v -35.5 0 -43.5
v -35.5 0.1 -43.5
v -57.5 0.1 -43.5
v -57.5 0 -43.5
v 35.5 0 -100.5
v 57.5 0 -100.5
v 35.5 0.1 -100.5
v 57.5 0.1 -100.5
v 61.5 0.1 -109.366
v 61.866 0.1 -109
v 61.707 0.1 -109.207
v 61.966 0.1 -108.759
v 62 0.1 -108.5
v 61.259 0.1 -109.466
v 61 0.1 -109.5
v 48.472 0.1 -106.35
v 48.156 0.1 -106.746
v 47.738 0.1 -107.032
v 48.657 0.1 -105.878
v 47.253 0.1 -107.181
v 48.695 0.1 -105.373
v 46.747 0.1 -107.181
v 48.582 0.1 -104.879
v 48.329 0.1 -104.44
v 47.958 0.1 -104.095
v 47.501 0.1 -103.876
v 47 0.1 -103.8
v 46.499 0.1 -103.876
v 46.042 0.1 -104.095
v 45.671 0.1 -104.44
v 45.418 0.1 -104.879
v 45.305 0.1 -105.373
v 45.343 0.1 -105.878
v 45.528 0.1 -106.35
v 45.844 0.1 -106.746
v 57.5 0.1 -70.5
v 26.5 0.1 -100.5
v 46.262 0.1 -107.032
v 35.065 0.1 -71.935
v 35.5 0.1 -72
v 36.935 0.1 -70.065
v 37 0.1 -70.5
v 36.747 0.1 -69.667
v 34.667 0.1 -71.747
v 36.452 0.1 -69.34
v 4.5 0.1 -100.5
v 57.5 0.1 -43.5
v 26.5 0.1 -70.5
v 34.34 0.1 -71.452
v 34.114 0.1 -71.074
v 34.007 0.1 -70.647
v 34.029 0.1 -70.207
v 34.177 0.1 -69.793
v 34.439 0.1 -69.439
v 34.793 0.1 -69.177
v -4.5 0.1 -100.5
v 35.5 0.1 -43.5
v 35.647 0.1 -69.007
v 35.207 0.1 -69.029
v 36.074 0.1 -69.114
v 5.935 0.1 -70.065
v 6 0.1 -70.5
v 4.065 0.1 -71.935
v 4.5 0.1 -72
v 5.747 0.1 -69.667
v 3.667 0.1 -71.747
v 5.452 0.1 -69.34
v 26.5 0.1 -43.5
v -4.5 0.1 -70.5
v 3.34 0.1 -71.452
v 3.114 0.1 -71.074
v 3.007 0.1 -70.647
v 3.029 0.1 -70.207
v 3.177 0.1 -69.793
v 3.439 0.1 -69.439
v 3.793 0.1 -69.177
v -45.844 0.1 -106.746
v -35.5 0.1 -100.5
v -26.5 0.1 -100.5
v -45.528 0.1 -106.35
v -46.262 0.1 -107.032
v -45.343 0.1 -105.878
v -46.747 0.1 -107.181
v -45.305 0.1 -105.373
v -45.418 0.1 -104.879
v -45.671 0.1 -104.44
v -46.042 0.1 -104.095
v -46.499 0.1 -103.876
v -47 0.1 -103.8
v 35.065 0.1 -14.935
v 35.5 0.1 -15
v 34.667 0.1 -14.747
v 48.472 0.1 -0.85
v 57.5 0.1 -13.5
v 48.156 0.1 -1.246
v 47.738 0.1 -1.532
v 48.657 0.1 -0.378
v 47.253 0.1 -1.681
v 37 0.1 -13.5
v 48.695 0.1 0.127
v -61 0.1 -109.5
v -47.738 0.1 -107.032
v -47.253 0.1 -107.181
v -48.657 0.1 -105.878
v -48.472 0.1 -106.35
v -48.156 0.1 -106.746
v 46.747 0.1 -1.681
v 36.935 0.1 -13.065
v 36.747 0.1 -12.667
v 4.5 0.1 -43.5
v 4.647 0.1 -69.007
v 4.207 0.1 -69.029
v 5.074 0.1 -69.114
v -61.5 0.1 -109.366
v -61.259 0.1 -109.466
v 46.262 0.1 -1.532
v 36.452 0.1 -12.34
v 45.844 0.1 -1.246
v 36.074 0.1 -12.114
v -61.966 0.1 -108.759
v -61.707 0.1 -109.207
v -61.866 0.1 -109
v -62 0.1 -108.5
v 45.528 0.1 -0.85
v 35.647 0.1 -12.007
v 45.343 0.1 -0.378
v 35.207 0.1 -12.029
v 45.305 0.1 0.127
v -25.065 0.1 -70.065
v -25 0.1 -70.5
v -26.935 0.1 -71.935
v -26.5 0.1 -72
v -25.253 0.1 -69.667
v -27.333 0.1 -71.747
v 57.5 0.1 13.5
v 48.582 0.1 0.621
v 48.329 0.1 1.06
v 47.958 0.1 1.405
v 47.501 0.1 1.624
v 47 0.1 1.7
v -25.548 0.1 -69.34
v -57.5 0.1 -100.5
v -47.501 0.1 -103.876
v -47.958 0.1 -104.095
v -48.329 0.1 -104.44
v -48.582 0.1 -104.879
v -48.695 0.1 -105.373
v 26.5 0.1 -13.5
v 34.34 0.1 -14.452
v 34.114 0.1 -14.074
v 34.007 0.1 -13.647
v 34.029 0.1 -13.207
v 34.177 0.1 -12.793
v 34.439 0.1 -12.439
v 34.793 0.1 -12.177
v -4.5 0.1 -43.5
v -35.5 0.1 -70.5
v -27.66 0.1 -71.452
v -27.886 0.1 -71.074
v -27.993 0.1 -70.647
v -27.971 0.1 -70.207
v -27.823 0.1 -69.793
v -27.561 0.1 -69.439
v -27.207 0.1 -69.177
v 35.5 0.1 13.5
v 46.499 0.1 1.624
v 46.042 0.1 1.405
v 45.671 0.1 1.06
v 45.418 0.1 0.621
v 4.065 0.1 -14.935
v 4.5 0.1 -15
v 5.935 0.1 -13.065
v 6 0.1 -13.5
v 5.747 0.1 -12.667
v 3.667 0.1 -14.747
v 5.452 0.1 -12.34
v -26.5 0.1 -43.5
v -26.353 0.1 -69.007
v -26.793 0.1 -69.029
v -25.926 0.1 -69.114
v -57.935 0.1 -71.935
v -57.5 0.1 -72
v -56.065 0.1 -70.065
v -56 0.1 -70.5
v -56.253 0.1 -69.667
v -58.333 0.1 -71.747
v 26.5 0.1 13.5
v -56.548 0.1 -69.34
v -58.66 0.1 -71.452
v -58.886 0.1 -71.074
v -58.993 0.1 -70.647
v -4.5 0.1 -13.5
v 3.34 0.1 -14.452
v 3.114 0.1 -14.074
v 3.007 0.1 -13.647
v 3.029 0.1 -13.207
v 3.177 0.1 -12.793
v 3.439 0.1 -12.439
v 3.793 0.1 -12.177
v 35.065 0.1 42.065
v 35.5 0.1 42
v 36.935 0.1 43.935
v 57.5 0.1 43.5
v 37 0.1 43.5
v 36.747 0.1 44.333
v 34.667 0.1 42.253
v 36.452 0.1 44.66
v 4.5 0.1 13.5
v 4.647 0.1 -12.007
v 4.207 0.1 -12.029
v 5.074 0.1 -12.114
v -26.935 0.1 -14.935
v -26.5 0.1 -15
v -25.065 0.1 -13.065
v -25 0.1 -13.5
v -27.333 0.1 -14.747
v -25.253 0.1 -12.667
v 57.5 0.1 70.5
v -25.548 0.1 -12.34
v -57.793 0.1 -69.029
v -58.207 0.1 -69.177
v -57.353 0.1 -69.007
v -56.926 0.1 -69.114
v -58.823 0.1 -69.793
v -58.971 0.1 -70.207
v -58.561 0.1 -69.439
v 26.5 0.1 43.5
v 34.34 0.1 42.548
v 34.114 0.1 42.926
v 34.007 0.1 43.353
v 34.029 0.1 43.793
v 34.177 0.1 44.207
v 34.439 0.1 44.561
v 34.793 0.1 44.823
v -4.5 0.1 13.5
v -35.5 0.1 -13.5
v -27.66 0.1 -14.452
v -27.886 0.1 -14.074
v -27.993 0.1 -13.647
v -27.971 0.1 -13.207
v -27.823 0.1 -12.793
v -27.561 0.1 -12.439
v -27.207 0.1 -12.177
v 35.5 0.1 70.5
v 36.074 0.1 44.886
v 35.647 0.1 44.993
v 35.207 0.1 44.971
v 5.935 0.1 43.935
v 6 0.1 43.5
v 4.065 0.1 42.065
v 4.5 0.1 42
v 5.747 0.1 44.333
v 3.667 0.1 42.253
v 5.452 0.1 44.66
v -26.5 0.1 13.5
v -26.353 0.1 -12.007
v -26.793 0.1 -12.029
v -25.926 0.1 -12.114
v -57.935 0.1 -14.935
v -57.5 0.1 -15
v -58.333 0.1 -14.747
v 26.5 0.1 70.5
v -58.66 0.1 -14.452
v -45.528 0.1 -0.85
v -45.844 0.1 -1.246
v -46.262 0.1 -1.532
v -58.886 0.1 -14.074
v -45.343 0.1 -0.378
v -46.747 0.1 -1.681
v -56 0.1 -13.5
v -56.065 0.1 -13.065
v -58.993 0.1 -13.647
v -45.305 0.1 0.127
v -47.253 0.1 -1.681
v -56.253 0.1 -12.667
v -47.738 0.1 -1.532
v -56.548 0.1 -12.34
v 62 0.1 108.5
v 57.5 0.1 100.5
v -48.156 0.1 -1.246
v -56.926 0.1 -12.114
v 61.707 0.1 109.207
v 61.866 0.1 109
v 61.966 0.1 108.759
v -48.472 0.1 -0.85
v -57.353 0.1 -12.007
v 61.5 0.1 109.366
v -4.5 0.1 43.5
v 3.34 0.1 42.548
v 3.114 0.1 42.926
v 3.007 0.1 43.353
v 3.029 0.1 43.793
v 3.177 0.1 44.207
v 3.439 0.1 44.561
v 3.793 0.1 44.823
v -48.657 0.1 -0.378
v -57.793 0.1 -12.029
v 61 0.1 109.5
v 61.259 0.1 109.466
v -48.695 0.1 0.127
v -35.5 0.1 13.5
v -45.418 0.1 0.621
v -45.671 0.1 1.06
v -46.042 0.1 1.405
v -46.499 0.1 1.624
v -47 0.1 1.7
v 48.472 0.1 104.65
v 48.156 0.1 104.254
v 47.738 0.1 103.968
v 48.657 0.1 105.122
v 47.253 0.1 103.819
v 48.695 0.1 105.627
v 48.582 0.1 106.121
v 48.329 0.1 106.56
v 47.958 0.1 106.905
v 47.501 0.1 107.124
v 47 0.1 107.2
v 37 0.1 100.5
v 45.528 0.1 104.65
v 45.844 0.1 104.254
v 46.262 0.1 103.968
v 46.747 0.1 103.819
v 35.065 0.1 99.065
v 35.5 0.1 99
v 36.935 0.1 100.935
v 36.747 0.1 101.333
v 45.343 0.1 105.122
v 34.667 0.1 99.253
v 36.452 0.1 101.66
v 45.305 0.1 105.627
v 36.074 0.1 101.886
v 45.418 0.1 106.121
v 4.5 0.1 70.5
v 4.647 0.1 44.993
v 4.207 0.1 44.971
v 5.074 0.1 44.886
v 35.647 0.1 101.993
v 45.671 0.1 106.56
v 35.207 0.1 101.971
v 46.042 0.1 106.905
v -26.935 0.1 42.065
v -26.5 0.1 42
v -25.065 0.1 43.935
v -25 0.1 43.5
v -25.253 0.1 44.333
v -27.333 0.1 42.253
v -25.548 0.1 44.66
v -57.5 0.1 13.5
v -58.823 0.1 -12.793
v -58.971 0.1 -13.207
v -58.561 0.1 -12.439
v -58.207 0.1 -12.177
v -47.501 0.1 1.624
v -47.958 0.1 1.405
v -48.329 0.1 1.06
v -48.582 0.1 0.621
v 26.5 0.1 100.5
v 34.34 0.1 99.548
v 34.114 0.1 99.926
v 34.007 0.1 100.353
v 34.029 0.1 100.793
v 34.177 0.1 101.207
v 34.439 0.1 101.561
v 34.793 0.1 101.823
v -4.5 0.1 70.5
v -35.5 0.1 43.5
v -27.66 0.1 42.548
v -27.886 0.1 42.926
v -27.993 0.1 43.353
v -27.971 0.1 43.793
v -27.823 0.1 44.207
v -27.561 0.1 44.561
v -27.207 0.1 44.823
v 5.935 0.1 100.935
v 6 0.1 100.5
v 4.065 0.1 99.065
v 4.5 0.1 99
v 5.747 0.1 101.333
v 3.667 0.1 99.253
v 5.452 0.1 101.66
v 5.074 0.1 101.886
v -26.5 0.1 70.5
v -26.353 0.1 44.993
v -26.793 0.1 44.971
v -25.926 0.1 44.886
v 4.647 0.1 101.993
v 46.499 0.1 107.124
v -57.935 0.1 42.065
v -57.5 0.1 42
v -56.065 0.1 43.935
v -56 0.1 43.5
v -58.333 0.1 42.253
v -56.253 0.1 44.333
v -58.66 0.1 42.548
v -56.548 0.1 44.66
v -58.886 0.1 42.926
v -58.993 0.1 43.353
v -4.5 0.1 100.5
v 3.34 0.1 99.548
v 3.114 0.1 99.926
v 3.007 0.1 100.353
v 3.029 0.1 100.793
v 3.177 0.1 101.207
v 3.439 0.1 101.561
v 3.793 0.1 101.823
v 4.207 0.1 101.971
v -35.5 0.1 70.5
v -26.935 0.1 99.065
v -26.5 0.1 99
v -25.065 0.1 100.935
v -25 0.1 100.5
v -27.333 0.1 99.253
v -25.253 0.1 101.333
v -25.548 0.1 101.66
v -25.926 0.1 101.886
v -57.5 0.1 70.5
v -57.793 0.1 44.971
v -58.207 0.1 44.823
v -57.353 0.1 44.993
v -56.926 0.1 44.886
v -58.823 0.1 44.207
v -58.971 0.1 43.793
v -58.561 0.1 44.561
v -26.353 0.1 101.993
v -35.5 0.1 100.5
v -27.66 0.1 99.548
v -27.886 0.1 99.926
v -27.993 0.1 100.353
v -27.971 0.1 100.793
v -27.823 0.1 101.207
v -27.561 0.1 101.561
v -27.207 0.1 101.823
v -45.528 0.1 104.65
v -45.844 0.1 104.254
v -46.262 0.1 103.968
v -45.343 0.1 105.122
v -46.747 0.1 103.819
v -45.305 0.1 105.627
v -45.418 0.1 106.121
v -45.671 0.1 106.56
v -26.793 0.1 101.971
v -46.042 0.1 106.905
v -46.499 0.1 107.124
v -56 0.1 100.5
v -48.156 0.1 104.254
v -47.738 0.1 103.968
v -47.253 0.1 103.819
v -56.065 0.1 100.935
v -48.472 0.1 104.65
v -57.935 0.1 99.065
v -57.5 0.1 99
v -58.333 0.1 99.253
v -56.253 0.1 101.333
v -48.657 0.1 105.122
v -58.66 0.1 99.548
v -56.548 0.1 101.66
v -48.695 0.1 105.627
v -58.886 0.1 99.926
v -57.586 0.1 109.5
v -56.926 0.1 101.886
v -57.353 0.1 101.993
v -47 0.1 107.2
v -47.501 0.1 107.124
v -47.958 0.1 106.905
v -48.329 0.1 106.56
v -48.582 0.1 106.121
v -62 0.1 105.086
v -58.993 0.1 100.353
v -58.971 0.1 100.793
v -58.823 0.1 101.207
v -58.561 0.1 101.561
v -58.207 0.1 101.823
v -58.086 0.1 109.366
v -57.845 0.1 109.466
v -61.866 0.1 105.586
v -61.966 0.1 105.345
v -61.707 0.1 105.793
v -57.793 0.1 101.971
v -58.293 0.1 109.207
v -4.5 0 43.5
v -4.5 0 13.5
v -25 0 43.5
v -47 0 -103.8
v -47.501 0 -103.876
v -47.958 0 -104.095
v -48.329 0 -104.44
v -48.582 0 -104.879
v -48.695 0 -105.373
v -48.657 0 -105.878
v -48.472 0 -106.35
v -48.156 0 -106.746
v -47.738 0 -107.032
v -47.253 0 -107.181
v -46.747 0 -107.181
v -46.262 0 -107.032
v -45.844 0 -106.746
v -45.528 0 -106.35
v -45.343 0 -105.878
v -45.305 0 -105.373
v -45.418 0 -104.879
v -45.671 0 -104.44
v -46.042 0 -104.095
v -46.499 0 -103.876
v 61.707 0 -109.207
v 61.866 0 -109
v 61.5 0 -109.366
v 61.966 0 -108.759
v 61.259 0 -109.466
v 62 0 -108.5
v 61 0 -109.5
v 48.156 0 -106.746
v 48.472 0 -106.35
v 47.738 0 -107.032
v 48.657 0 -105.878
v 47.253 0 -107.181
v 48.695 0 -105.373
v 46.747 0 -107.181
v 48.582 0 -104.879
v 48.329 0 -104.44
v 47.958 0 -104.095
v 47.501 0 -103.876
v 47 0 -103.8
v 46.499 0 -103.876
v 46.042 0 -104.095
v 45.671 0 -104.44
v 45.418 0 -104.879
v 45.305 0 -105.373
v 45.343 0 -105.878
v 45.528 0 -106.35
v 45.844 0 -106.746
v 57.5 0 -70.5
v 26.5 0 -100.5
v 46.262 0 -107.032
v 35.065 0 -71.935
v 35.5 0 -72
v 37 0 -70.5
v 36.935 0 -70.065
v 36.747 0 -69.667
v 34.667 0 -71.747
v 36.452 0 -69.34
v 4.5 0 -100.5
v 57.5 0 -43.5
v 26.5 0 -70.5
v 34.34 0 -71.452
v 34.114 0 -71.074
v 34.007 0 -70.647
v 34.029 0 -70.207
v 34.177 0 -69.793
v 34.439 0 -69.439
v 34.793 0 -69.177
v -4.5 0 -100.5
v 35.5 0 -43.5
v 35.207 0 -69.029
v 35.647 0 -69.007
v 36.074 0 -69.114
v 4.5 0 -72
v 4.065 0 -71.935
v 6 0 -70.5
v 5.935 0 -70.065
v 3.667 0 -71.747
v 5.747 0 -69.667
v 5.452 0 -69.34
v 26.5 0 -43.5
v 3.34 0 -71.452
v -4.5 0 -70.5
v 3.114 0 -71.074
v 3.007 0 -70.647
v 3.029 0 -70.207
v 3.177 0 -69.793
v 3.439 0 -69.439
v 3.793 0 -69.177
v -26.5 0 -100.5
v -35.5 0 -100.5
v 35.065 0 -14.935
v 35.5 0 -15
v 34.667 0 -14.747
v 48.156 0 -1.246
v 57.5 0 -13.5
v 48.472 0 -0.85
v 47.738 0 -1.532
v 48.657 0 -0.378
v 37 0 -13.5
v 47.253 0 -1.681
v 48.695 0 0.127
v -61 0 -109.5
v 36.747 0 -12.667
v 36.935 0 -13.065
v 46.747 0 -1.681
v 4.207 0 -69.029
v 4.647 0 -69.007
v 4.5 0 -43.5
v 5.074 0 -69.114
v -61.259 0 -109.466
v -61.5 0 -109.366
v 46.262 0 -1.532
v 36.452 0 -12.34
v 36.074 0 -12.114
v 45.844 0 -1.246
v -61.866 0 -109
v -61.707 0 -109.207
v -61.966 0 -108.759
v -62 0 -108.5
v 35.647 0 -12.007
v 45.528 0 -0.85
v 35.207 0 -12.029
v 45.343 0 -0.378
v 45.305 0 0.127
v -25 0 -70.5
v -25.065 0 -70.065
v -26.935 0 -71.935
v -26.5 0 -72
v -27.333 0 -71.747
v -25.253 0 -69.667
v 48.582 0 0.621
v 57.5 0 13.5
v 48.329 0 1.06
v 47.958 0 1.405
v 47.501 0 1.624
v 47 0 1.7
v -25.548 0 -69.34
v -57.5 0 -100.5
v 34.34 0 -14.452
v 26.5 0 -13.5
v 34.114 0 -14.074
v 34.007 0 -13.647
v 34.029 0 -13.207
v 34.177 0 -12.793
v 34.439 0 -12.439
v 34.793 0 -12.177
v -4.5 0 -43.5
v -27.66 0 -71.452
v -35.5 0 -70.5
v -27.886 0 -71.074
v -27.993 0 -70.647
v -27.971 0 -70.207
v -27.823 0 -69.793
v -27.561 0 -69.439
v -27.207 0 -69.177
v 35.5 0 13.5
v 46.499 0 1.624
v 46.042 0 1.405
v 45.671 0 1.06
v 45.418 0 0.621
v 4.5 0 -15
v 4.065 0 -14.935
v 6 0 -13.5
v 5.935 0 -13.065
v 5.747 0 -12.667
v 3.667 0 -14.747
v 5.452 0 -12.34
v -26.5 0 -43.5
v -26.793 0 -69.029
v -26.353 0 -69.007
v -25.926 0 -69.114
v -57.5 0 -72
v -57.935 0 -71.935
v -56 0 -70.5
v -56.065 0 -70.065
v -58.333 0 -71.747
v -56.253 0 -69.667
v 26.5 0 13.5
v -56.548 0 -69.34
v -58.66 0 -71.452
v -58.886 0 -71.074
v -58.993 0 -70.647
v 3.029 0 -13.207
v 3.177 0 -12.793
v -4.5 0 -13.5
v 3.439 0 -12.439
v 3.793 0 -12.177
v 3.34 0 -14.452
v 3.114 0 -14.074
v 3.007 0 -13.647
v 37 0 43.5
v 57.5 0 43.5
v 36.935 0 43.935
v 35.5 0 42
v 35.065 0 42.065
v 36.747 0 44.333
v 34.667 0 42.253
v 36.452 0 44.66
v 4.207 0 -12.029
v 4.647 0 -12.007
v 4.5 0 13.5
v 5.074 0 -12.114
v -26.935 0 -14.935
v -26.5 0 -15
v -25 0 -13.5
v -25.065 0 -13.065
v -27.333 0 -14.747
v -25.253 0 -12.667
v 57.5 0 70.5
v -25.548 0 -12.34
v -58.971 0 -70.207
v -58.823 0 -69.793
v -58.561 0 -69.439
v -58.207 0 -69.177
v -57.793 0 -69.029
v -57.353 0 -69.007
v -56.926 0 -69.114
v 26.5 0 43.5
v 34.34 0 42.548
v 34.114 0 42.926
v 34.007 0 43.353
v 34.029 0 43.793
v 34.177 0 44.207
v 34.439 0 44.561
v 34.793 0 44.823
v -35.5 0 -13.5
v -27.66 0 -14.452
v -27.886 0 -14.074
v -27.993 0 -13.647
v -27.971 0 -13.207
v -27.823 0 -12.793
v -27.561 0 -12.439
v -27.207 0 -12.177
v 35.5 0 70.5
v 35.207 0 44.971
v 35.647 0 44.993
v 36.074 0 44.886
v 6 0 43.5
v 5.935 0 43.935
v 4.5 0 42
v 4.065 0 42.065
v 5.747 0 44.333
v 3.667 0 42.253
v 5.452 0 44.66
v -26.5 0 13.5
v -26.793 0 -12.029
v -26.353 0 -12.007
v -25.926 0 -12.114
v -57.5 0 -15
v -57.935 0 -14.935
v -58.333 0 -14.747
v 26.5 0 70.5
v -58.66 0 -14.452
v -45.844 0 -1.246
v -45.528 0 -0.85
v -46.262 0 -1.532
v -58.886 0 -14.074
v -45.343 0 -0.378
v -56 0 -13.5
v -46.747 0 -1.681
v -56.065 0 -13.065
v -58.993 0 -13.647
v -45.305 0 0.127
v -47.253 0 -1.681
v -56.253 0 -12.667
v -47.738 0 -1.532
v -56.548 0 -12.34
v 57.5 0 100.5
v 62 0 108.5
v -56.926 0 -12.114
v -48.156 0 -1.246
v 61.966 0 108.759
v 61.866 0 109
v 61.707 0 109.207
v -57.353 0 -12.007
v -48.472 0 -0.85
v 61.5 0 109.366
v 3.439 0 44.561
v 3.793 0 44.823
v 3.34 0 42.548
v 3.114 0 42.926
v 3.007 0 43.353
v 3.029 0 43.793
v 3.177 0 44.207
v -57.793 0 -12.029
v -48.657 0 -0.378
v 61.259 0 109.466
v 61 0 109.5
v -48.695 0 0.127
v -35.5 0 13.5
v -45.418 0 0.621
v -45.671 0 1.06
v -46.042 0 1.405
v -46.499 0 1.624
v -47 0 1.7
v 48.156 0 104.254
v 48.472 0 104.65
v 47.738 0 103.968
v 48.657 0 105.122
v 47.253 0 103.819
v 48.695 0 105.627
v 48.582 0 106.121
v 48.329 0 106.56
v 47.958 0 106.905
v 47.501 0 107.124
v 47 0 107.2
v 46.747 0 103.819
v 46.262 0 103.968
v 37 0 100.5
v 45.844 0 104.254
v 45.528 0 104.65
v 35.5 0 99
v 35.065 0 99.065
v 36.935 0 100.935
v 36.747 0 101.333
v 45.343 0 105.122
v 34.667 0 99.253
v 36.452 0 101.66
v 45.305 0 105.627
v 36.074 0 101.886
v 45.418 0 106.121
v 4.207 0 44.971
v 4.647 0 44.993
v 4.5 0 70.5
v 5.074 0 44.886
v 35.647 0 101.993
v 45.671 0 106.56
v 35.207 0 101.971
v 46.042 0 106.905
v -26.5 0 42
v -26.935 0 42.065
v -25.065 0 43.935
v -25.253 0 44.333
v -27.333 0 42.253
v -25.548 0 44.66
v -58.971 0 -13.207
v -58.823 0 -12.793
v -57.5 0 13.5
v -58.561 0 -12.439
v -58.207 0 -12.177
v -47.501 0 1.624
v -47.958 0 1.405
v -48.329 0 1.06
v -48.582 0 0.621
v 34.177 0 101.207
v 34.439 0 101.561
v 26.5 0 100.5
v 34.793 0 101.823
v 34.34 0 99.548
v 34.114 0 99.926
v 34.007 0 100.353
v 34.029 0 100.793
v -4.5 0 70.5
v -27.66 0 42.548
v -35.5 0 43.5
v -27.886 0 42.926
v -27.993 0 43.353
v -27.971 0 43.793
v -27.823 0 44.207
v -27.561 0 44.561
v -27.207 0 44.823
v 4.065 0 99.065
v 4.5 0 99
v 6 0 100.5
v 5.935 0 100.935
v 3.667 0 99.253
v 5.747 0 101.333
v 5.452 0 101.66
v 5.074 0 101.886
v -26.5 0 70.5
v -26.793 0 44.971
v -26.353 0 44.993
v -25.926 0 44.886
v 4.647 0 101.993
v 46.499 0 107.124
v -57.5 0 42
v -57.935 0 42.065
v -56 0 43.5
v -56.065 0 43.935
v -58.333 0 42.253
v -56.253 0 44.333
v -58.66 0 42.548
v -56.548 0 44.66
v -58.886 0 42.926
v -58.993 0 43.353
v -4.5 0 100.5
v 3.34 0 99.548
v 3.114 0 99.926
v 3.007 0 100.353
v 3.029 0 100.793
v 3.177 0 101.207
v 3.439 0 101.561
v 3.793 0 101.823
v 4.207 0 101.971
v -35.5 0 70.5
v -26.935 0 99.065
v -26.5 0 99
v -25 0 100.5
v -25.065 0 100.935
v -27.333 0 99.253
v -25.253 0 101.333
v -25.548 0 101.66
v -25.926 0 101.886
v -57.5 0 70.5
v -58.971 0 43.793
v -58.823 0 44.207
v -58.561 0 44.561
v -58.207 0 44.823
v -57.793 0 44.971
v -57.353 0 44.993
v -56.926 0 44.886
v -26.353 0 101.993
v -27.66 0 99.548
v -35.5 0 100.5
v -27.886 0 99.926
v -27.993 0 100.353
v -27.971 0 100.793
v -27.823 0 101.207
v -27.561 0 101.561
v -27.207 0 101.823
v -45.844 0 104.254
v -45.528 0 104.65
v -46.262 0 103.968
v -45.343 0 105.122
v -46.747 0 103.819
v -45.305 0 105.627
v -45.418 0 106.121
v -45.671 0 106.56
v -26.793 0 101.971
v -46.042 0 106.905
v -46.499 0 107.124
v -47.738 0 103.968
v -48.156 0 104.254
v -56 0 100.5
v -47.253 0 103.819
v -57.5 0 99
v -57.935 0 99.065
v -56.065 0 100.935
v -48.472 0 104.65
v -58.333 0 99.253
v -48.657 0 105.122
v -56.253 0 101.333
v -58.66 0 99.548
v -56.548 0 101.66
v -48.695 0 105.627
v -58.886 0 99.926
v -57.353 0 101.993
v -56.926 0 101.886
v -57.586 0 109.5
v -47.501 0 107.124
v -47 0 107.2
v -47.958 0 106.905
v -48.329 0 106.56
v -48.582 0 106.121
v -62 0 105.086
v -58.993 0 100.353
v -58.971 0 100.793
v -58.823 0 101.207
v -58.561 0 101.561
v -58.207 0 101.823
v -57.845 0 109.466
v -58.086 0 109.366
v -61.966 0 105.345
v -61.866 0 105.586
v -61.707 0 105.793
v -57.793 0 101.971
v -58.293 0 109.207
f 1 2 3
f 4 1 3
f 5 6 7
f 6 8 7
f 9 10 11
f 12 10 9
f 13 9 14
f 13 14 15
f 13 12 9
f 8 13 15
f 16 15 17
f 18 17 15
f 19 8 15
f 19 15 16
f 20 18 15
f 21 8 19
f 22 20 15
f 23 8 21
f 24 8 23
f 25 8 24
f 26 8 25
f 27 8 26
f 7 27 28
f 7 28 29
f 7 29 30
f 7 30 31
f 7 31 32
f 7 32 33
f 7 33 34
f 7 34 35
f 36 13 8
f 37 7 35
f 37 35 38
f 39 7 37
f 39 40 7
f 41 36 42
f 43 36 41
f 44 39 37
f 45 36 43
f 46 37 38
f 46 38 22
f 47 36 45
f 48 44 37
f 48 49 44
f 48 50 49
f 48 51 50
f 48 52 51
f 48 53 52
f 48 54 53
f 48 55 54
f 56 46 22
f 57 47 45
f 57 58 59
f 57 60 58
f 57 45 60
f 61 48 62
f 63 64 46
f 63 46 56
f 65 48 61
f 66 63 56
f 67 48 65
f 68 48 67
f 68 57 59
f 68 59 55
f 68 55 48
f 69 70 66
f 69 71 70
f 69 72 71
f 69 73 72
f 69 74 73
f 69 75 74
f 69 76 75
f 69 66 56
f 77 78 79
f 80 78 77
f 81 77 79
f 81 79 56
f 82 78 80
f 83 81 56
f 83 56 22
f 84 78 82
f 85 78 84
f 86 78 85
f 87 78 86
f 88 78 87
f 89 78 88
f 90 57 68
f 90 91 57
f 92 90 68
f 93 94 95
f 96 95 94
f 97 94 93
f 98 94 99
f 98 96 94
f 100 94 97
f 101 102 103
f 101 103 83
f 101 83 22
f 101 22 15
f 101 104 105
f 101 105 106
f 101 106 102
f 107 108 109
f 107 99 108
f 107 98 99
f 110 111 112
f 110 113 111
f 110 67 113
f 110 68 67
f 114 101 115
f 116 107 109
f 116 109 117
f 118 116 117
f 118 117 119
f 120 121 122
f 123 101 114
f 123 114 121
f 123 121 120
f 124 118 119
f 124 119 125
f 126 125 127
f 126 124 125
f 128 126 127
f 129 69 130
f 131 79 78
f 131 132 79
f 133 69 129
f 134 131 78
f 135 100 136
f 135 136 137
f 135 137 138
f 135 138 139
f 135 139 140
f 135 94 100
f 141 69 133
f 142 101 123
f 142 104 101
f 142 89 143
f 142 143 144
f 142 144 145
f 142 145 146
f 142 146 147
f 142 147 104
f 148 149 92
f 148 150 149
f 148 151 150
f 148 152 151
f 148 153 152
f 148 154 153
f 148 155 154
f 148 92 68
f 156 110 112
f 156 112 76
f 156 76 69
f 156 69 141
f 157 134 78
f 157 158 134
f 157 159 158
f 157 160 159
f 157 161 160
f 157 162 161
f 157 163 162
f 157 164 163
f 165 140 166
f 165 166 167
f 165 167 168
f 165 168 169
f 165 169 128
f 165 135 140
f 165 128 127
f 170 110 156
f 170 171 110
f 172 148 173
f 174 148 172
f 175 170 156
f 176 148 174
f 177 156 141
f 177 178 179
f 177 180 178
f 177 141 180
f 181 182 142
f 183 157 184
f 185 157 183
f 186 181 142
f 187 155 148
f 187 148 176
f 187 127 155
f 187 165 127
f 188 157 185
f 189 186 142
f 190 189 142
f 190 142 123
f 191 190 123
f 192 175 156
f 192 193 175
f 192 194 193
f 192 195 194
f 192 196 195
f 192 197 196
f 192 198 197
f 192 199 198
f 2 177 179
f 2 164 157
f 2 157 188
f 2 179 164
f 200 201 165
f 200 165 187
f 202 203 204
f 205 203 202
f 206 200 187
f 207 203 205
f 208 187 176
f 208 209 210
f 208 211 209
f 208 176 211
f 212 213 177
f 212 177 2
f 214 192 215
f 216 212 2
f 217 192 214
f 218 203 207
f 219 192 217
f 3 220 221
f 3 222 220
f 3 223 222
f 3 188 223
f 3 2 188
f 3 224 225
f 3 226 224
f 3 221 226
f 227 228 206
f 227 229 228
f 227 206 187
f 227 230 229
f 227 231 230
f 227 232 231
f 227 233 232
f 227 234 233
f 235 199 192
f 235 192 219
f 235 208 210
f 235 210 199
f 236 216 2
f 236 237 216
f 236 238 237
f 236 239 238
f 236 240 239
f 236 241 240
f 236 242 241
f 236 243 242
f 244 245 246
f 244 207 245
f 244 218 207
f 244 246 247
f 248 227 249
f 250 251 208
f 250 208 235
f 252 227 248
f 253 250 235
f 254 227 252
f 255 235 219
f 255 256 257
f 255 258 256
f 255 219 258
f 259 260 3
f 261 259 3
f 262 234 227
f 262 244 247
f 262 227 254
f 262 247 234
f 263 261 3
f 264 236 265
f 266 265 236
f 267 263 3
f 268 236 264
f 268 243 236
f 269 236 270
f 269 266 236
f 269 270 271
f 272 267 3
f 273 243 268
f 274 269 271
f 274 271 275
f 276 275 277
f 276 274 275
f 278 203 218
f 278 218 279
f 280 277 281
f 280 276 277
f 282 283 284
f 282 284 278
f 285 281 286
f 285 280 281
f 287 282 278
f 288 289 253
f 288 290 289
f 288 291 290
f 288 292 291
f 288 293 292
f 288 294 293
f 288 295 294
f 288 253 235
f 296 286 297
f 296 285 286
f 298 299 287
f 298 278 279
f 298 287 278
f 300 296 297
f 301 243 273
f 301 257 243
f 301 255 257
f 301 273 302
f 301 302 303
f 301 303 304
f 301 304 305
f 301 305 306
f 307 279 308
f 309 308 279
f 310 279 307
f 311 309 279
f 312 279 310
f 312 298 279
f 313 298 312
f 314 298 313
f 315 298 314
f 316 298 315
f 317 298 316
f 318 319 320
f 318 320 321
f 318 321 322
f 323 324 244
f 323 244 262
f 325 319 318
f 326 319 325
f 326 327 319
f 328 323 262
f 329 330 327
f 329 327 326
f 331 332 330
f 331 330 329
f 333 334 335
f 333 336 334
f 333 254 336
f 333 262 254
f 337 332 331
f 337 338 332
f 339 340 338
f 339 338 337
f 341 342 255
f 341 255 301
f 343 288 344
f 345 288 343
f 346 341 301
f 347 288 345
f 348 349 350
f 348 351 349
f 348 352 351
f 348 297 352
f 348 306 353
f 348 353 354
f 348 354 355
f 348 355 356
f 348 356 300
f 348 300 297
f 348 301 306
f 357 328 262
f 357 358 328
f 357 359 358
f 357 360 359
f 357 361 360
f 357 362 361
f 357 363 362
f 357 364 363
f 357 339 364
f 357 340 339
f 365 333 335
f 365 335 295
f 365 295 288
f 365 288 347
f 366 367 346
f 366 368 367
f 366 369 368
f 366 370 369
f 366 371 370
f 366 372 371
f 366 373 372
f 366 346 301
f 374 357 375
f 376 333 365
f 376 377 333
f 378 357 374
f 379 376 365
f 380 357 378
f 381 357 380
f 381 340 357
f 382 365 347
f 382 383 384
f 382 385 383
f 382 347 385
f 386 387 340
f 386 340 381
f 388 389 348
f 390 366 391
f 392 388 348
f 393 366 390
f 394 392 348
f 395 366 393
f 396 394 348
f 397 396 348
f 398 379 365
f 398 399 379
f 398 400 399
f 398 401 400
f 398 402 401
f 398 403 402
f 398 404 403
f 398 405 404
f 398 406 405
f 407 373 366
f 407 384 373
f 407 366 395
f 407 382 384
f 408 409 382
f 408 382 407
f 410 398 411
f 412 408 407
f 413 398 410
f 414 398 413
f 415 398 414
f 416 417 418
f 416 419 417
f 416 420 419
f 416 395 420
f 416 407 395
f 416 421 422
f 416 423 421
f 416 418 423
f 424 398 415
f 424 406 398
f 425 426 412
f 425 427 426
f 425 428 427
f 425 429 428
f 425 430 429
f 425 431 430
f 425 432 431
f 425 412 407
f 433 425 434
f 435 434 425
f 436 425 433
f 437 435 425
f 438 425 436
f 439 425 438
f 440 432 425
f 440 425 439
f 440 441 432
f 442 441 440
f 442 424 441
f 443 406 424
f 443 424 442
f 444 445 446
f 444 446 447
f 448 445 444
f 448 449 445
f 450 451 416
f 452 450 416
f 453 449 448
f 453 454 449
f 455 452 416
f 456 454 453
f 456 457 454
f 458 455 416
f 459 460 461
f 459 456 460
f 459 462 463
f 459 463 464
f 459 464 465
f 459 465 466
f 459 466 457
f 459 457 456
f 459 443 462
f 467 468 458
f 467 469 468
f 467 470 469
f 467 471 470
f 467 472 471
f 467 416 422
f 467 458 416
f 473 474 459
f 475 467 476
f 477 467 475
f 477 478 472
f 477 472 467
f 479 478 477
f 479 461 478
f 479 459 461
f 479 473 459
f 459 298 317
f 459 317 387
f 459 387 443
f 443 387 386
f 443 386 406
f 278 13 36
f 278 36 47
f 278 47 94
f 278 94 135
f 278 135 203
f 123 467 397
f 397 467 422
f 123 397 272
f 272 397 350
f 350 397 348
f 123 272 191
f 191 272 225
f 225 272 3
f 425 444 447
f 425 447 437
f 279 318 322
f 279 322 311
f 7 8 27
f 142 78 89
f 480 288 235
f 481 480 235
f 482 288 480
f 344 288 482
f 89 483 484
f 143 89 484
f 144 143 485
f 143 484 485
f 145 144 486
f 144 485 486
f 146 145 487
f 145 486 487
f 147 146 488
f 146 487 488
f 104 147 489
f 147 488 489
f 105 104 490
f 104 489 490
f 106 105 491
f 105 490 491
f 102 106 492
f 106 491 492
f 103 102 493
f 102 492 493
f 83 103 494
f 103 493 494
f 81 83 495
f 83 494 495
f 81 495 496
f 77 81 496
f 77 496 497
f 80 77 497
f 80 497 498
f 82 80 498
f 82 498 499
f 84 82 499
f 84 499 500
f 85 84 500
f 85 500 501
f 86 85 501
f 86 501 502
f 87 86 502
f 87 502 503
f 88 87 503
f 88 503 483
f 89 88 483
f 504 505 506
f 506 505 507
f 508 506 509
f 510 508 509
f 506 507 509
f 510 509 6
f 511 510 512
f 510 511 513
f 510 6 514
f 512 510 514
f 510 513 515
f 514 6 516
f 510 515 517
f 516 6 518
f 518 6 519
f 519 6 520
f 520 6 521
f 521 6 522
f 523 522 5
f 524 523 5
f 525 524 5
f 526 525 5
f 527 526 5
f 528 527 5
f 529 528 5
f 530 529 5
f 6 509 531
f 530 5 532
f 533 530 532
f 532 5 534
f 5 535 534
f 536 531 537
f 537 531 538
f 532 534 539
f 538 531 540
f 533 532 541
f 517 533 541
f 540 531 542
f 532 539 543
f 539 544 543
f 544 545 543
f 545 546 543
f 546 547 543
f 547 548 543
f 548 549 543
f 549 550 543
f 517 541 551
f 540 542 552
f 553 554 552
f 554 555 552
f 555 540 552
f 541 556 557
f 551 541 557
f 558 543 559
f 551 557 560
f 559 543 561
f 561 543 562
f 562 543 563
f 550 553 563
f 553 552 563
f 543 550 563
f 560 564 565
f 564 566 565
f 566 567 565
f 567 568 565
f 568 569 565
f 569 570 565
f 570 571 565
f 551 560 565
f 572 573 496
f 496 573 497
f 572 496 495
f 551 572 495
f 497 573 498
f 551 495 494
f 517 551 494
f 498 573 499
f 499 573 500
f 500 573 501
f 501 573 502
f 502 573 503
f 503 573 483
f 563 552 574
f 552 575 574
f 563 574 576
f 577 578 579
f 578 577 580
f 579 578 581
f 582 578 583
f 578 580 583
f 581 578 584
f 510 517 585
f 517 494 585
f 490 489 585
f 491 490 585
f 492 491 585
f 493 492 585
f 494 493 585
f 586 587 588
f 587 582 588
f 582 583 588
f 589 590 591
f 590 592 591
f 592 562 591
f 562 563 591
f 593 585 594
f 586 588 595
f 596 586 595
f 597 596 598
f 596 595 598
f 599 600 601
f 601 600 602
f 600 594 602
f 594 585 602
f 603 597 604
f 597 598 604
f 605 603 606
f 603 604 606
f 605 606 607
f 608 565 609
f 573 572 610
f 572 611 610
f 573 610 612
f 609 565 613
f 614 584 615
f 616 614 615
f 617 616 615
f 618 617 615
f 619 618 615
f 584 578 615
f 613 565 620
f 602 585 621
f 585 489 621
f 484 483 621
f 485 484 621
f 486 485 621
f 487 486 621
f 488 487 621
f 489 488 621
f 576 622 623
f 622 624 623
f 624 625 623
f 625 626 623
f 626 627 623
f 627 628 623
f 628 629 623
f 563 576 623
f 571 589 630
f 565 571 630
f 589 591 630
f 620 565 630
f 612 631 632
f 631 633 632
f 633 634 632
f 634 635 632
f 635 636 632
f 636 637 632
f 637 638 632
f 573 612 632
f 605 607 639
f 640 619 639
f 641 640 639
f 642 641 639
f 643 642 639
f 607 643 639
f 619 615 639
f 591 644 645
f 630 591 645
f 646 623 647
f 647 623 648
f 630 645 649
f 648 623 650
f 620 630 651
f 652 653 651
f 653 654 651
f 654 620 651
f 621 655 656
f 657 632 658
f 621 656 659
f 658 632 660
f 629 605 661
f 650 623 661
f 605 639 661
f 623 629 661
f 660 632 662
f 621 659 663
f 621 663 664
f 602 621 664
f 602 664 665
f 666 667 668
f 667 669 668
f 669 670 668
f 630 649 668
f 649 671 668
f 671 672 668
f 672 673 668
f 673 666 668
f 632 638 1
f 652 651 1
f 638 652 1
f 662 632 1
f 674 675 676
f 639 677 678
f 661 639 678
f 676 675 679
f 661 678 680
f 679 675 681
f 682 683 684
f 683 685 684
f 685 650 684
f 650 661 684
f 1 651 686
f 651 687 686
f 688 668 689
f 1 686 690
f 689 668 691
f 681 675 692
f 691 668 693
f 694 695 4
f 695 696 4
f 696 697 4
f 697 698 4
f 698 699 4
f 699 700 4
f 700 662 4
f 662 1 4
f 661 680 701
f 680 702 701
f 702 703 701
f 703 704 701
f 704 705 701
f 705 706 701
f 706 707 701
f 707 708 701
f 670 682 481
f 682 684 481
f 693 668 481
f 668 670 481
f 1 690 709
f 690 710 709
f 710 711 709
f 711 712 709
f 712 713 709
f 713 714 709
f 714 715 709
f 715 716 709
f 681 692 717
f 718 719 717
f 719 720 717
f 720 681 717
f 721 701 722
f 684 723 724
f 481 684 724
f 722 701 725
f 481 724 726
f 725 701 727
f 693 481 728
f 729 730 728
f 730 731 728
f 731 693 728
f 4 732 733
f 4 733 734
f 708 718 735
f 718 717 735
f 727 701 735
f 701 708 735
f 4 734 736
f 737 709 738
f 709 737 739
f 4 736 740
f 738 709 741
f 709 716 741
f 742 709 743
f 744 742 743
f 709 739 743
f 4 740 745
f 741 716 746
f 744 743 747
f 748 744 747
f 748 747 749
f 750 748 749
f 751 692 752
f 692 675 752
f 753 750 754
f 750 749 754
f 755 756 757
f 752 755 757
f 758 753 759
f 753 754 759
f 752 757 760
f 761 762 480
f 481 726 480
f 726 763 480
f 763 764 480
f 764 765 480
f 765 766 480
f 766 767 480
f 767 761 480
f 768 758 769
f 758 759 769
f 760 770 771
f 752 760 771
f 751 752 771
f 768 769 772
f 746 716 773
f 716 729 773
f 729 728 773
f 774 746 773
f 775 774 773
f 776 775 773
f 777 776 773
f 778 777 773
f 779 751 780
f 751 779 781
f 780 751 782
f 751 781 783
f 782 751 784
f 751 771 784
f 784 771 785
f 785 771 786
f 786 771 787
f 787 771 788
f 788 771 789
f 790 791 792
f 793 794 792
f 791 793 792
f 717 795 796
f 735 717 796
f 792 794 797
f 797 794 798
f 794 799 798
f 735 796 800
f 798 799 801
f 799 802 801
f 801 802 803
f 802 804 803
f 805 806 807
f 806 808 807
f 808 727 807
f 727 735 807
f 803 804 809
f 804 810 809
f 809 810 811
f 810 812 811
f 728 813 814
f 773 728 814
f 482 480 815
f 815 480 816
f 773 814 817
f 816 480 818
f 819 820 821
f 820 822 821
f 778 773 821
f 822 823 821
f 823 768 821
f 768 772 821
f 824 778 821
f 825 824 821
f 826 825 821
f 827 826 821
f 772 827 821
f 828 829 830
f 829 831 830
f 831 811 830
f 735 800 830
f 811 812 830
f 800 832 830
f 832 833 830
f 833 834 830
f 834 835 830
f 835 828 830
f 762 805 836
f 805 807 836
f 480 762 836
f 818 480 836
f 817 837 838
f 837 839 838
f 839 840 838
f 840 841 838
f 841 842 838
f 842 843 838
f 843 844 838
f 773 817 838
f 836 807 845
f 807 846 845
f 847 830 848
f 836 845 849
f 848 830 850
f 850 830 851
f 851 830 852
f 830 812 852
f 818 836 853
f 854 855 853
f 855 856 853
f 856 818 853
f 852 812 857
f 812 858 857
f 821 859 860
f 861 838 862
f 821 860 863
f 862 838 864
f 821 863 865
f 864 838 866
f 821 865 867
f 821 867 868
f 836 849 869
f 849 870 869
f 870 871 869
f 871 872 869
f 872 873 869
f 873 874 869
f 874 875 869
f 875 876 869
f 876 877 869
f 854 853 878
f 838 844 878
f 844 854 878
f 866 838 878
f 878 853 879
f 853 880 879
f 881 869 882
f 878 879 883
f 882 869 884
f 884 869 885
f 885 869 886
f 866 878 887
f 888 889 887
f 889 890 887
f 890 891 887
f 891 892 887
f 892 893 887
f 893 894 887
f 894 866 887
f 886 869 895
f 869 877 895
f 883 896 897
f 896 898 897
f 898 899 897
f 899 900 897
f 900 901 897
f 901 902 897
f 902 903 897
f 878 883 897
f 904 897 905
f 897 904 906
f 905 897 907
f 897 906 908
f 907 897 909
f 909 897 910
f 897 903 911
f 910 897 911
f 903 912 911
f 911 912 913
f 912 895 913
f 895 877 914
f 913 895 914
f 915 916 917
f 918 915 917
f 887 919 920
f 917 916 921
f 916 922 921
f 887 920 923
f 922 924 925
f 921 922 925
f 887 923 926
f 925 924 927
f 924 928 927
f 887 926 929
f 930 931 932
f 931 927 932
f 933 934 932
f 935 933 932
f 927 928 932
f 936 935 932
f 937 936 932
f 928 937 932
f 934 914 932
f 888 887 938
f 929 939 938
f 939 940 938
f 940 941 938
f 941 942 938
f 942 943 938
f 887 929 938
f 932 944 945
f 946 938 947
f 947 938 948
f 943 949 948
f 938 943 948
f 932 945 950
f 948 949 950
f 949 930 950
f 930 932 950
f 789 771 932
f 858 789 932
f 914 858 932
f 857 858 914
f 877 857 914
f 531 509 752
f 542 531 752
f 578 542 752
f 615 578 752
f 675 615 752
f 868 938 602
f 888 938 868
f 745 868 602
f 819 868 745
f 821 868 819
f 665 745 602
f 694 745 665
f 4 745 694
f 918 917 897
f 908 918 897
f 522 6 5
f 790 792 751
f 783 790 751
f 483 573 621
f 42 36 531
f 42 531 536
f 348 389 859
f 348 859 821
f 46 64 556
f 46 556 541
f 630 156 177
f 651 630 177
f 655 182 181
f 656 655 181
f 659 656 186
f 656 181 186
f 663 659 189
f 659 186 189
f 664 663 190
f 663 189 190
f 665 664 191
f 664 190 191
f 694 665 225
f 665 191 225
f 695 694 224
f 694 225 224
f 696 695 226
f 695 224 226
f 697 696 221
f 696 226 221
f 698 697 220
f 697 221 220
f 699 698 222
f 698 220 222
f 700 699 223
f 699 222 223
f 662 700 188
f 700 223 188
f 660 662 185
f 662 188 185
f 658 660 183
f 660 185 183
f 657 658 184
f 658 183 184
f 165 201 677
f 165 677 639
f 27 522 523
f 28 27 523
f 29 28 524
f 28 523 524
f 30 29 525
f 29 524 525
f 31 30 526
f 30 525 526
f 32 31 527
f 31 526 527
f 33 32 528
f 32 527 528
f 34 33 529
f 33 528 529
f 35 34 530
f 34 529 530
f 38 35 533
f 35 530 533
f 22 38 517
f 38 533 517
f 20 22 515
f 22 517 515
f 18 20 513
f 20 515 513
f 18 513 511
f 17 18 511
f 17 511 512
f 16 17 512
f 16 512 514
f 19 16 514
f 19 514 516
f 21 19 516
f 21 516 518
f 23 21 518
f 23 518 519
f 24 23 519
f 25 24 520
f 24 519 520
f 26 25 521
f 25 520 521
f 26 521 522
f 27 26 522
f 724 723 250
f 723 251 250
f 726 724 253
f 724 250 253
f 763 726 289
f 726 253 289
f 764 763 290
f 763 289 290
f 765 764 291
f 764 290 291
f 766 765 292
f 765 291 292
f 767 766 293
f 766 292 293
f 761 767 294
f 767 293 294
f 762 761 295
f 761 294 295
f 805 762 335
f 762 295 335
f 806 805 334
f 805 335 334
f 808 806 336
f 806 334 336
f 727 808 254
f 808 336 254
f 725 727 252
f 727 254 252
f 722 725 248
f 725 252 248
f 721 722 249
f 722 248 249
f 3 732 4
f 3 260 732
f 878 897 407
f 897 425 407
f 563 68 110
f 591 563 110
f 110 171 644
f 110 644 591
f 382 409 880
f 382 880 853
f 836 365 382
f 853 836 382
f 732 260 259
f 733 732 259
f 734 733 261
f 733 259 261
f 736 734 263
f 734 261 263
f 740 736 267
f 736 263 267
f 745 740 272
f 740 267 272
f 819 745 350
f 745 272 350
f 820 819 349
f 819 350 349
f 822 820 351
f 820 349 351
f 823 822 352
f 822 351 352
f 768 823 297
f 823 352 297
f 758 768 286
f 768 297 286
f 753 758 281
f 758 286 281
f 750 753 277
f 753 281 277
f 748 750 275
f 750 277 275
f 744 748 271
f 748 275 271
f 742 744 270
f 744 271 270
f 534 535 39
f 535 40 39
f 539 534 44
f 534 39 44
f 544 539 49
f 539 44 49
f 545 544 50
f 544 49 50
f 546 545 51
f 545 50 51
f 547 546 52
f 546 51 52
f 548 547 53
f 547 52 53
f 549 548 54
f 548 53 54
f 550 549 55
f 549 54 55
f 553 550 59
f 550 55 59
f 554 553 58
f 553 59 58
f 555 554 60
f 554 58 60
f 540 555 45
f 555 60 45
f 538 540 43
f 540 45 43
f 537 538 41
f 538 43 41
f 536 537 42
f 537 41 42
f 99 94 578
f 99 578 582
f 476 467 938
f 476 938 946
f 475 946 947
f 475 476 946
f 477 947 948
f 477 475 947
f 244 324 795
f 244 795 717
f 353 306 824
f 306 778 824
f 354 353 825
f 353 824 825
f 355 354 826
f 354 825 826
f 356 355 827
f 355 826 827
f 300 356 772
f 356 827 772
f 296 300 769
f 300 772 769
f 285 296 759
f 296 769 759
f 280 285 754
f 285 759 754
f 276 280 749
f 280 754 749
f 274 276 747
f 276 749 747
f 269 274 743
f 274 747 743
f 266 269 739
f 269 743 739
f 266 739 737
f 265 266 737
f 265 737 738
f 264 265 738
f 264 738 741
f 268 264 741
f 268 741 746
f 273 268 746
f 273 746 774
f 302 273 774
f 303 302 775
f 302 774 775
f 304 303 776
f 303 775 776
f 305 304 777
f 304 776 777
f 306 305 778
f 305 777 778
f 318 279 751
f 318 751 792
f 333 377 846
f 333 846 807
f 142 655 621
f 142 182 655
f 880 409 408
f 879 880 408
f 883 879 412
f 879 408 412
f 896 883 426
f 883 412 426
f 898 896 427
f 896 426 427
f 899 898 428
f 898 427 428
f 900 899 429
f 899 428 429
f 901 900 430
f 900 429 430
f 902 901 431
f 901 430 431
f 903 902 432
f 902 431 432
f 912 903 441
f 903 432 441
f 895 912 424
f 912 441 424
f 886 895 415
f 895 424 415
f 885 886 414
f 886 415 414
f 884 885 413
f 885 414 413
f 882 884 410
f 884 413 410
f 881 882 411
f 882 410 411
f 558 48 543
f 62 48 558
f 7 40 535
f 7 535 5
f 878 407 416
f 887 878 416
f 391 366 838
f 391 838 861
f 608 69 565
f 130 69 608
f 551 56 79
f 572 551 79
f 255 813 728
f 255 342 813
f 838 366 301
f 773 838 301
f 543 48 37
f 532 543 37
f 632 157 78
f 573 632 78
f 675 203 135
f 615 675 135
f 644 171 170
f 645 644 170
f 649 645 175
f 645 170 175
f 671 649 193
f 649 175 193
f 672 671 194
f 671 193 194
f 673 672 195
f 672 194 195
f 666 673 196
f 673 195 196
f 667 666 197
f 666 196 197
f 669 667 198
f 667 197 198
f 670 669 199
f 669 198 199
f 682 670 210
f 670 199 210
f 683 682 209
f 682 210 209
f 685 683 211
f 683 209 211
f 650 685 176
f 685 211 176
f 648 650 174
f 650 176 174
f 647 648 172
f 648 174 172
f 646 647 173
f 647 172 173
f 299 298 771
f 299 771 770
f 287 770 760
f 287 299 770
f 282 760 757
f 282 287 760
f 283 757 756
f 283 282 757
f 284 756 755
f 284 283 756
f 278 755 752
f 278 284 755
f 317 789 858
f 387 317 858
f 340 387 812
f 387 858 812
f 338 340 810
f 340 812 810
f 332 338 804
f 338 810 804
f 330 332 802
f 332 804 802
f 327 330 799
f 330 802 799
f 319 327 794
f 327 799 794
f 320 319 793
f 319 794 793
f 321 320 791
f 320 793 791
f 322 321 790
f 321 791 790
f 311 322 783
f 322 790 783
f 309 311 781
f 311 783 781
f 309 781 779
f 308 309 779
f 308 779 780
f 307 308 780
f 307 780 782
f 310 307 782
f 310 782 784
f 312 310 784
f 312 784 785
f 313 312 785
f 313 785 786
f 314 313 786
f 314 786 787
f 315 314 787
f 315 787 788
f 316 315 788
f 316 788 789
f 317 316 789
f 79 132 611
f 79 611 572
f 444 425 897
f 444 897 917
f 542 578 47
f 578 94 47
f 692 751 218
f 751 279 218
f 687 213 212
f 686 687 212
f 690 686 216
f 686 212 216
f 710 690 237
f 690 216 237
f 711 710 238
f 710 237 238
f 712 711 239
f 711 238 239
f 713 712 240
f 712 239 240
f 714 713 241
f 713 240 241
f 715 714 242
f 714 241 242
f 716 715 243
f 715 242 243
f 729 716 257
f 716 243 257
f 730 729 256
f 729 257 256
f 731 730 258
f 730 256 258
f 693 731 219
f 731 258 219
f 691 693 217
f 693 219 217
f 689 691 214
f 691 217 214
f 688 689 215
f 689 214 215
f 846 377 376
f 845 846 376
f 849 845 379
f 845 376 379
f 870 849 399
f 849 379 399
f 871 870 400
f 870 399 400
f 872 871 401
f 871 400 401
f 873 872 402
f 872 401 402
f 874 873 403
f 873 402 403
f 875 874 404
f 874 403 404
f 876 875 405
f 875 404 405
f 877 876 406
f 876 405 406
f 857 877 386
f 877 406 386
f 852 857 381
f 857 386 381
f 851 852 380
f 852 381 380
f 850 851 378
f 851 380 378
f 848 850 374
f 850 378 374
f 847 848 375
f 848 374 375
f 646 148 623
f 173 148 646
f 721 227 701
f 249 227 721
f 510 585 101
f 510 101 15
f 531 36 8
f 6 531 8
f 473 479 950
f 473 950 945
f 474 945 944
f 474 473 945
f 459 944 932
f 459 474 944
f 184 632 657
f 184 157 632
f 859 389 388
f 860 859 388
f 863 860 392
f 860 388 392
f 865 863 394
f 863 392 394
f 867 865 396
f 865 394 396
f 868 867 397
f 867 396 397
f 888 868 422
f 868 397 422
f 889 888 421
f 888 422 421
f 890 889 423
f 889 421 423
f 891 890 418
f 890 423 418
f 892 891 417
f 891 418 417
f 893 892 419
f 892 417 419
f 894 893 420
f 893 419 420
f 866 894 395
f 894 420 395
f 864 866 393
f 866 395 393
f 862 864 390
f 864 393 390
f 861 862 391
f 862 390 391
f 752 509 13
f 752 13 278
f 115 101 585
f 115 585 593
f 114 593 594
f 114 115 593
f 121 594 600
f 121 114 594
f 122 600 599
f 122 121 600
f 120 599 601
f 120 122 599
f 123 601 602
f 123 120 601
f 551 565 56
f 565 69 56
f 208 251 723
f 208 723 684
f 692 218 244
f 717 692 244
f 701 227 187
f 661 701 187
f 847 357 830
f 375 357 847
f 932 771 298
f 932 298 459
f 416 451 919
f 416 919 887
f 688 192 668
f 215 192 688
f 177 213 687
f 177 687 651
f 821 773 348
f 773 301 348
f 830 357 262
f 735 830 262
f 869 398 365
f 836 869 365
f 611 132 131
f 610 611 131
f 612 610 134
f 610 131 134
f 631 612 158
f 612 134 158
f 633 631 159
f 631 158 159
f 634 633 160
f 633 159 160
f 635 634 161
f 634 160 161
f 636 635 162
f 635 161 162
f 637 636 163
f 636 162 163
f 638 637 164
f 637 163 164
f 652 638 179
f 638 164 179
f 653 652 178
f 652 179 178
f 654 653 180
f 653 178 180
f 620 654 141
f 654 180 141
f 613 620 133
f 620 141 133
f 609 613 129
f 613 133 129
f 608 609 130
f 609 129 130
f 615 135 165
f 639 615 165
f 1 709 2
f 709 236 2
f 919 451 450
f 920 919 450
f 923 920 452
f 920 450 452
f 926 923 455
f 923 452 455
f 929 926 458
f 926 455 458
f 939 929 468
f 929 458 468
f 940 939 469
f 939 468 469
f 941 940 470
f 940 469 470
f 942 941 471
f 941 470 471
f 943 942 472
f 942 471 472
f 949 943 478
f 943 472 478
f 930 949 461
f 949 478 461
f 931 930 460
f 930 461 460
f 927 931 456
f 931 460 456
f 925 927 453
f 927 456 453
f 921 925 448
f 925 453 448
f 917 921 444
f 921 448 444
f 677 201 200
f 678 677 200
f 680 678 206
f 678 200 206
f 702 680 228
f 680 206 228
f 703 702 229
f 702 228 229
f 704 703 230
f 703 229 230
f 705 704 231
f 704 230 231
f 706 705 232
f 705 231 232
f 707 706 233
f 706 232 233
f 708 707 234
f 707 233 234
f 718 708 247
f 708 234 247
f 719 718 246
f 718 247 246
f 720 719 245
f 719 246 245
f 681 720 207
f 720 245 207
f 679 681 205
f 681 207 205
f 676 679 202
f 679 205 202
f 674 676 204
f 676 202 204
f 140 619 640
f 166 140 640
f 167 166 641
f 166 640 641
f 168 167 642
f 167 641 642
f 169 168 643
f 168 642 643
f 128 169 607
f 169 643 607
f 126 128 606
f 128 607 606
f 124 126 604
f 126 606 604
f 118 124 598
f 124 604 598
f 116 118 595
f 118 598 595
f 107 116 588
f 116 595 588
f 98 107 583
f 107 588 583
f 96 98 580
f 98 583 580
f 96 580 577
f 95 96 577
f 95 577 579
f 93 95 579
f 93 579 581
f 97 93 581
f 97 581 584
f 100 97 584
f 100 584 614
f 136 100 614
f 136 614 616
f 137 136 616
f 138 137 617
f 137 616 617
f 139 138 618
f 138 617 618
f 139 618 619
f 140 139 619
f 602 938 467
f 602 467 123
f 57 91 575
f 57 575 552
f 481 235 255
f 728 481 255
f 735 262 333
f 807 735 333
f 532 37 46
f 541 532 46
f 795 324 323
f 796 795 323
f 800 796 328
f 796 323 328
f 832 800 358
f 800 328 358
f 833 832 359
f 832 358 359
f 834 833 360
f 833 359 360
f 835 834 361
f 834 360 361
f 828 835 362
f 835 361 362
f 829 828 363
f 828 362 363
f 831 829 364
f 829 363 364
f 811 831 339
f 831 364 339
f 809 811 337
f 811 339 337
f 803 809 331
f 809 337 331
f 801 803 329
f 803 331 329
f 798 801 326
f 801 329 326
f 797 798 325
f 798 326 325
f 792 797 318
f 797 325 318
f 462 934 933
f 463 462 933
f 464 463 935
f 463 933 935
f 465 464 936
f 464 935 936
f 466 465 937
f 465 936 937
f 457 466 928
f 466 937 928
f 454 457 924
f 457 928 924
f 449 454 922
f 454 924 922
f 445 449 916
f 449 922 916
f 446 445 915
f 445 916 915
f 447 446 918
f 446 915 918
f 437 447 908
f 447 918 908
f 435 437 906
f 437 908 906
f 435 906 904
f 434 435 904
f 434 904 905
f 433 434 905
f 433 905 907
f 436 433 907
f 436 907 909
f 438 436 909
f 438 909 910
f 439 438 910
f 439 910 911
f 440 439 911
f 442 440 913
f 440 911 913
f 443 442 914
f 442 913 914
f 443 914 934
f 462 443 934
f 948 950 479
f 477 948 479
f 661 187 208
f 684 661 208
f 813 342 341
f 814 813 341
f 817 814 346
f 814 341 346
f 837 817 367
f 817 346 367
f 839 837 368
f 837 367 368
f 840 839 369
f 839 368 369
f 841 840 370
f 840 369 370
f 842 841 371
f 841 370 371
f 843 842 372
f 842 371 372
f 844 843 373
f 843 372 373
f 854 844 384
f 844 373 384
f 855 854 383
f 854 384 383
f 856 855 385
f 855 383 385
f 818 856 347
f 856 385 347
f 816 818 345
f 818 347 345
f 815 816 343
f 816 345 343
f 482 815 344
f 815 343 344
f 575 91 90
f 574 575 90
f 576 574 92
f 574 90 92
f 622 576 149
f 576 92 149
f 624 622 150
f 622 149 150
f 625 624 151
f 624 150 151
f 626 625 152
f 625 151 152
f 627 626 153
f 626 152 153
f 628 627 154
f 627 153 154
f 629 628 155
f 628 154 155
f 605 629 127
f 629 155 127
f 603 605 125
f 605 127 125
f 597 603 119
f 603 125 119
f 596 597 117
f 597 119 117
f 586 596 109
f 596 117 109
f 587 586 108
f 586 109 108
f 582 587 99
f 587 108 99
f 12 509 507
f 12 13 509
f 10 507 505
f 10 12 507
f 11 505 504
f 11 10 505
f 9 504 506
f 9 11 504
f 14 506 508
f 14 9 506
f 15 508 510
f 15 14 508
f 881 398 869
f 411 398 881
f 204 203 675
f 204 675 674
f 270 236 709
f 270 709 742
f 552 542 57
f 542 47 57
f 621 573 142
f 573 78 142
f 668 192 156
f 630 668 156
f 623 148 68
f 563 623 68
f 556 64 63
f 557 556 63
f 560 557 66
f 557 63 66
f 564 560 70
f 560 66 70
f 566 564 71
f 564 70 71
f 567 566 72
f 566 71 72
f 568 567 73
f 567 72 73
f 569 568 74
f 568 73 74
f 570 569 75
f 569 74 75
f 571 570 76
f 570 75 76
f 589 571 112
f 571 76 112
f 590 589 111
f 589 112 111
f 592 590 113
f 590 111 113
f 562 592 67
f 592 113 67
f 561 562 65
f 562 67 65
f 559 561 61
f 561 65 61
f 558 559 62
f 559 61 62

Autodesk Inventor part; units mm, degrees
ref_plane "YZ Plane" through (0, 0, 0) normal (1, 0, 0) x (0, 1, 0)
ref_plane "XZ Plane" through (0, 0, 0) normal (0, 1, 0) x (-1, 0, 0)
ref_plane "XY Plane" through (0, 0, 0) normal (0, 0, 1) x (1, 0, 0)
sketch "Sketch1" plane through (0, 0, 0) normal (0, 1, 0) x (-1, 0, 0)
  line L0 (-62, 109.5) -> (62, 109.5)
  line L1 (62, 109.5) -> (62, -109.5)
  line L2 (62, -109.5) -> (-62, -109.5)
  line L3 (-62, -109.5) -> (-62, 109.5)
  line L4 (-62, 109.5) -> (62, -109.5) construction
  line L5 (62, 109.5) -> (-62, -109.5) construction
  point P0 (0, 0)
  dimension "d0" = 219
  dimension "d1" = 124
extrude "Extrusion1" add sketch "Sketch1" along normal blind 0.1
chamfer "Chamfer1" distance 4 angle 45 1 edges at (-62, 0.05, 109.5)
sketch "Sketch2" plane through (0, 0.1, 0) normal (0, 1, 0) x (1, 0, 0)
  line L0 (-35.5, -100.5) -> (-35.5, -70.5)
  line L1 (-35.5, -70.5) -> (-57.5, -70.5)
  line L2 (-62, 109.5) -> (-62, -109.5) projected
  line L3 (-62, -109.5) -> (62, -109.5) projected
  arc A0 (-57.5, -99) -> (-56, -100.5) centre (-57.5, -100.5) ccw
  line L4 (-35.5, -100.5) -> (-56, -100.5)
  line L5 (-57.5, -99) -> (-57.5, -70.5)
  line L6 (62, -109.5) -> (62, 109.5) projected
  line L7 (-35.5, -43.5) -> (-35.5, -13.5)
  line L8 (-35.5, -43.5) -> (-56, -43.5)
  line L9 (-35.5, -13.5) -> (-57.5, -13.5)
  line L10 (-57.5, -42) -> (-57.5, -13.5)
  arc A1 (-57.5, -42) -> (-56, -43.5) centre (-57.5, -43.5) ccw
  line L11 (-35.5, 13.5) -> (-35.5, 43.5)
  line L12 (-35.5, 13.5) -> (-56, 13.5)
  line L13 (-35.5, 43.5) -> (-57.5, 43.5)
  line L14 (-57.5, 15) -> (-57.5, 43.5)
  arc A2 (-57.5, 15) -> (-56, 13.5) centre (-57.5, 13.5) ccw
  line L15 (-35.5, 70.5) -> (-35.5, 100.5)
  line L16 (-35.5, 70.5) -> (-56, 70.5)
  line L17 (-35.5, 100.5) -> (-57.5, 100.5)
  line L18 (-57.5, 72) -> (-57.5, 100.5)
  arc A3 (-57.5, 72) -> (-56, 70.5) centre (-57.5, 70.5) ccw
  line L19 (-4.5, -100.5) -> (-4.5, -70.5)
  line L20 (-4.5, -100.5) -> (-25, -100.5)
  line L21 (-4.5, -70.5) -> (-26.5, -70.5)
  line L22 (-26.5, -99) -> (-26.5, -70.5)
  arc A4 (-26.5, -99) -> (-25, -100.5) centre (-26.5, -100.5) ccw
  line L23 (-4.5, -43.5) -> (-4.5, -13.5)
  line L24 (-4.5, -43.5) -> (-25, -43.5)
  line L25 (-4.5, -13.5) -> (-26.5, -13.5)
  line L26 (-26.5, -42) -> (-26.5, -13.5)
  arc A5 (-26.5, -42) -> (-25, -43.5) centre (-26.5, -43.5) ccw
  line L27 (-4.5, 13.5) -> (-4.5, 43.5)
  line L28 (-4.5, 13.5) -> (-25, 13.5)
  line L29 (-4.5, 43.5) -> (-26.5, 43.5)
  line L30 (-26.5, 15) -> (-26.5, 43.5)
  arc A6 (-26.5, 15) -> (-25, 13.5) centre (-26.5, 13.5) ccw
  line L31 (-4.5, 70.5) -> (-4.5, 100.5)
  line L32 (-4.5, 70.5) -> (-25, 70.5)
  line L33 (-4.5, 100.5) -> (-26.5, 100.5)
  line L34 (-26.5, 72) -> (-26.5, 100.5)
  arc A7 (-26.5, 72) -> (-25, 70.5) centre (-26.5, 70.5) ccw
  line L35 (26.5, -100.5) -> (26.5, -70.5)
  line L36 (26.5, -100.5) -> (6, -100.5)
  line L37 (26.5, -70.5) -> (4.5, -70.5)
  line L38 (4.5, -99) -> (4.5, -70.5)
  arc A8 (4.5, -99) -> (6, -100.5) centre (4.5, -100.5) ccw
  line L39 (26.5, -43.5) -> (26.5, -13.5)
  line L40 (26.5, -43.5) -> (6, -43.5)
  line L41 (26.5, -13.5) -> (4.5, -13.5)
  line L42 (4.5, -42) -> (4.5, -13.5)
  arc A9 (4.5, -42) -> (6, -43.5) centre (4.5, -43.5) ccw
  line L43 (26.5, 13.5) -> (26.5, 43.5)
  line L44 (26.5, 13.5) -> (6, 13.5)
  line L45 (26.5, 43.5) -> (4.5, 43.5)
  line L46 (4.5, 15) -> (4.5, 43.5)
  arc A10 (4.5, 15) -> (6, 13.5) centre (4.5, 13.5) ccw
  line L47 (26.5, 70.5) -> (26.5, 100.5)
  line L48 (26.5, 70.5) -> (6, 70.5)
  line L49 (26.5, 100.5) -> (4.5, 100.5)
  line L50 (4.5, 72) -> (4.5, 100.5)
  arc A11 (4.5, 72) -> (6, 70.5) centre (4.5, 70.5) ccw
  line L51 (57.5, -100.5) -> (57.5, -70.5)
  line L52 (57.5, -100.5) -> (37, -100.5)
  line L53 (57.5, -70.5) -> (35.5, -70.5)
  line L54 (35.5, -99) -> (35.5, -70.5)
  arc A12 (35.5, -99) -> (37, -100.5) centre (35.5, -100.5) ccw
  line L55 (57.5, -43.5) -> (57.5, -13.5)
  line L56 (57.5, -43.5) -> (37, -43.5)
  line L57 (57.5, -13.5) -> (35.5, -13.5)
  line L58 (35.5, -42) -> (35.5, -13.5)
  arc A13 (35.5, -42) -> (37, -43.5) centre (35.5, -43.5) ccw
  line L59 (57.5, 13.5) -> (57.5, 43.5)
  line L60 (57.5, 13.5) -> (37, 13.5)
  line L61 (57.5, 43.5) -> (35.5, 43.5)
  line L62 (35.5, 15) -> (35.5, 43.5)
  arc A14 (35.5, 15) -> (37, 13.5) centre (35.5, 13.5) ccw
  line L63 (57.5, 70.5) -> (57.5, 100.5)
  line L64 (57.5, 70.5) -> (37, 70.5)
  line L65 (57.5, 100.5) -> (35.5, 100.5)
  line L66 (35.5, 72) -> (35.5, 100.5)
  arc A15 (35.5, 72) -> (37, 70.5) centre (35.5, 70.5) ccw
  dimension "d46" = 1.5
  dimension "d47" = 30
  dimension "d50" = 9
  dimension "d51" = 4.5
  dimension "d62" = 57
  dimension "d65" = 31
  dimension "d77" = 22
extrude "Extrusion2" cut sketch "Sketch2" against normal through all
fillet "Fillet1" radius 1 5 edges at (62, 0.05, 109.5) (-58, 0.05, 109.5) (-62, 0.05, 105.5) (62, 0.05, -109.5) (-62, 0.05, -109.5)
sketch "Sketch3" plane through (0, 0.1, 0) normal (0, 1, 0) x (1, 0, 0)
  line L0 (-62, 108.5) -> (-62, -105.0858) projected
  line L1 (62, -108.5) -> (62, 108.5) projected
  line L2 (-57.5858, -109.5) -> (61, -109.5) projected
  line L3 (61, 109.5) -> (-61, 109.5) projected
  point P0 (0, 0)
  point P1 (-47, -105.5)
  point P2 (47, -105.5)
  point P3 (47, 105.5)
  point P4 (-47, 105.5)
  point P5 (-47, 0)
  point P6 (47, 0)
  dimension "d90" = 15
  dimension "d91" = 15
  dimension "d92" = 4
  dimension "d93" = 4
hole "Hole1" at (-47, 0.1, 105.5) at (47, 0.1, 105.5) at (47, 0.1, -105.5) at (-47, 0.1, -105.5) at (-47, 0.1, 0) at (47, 0.1, 0) direction (0, -1, 0) diameter 3.4 end through all clearance for "Flat Head Machine Screw" size "M3" standard "Ansi Metric M Profile"
properties part number "Assembly Stencil" material "Stainless Steel"
